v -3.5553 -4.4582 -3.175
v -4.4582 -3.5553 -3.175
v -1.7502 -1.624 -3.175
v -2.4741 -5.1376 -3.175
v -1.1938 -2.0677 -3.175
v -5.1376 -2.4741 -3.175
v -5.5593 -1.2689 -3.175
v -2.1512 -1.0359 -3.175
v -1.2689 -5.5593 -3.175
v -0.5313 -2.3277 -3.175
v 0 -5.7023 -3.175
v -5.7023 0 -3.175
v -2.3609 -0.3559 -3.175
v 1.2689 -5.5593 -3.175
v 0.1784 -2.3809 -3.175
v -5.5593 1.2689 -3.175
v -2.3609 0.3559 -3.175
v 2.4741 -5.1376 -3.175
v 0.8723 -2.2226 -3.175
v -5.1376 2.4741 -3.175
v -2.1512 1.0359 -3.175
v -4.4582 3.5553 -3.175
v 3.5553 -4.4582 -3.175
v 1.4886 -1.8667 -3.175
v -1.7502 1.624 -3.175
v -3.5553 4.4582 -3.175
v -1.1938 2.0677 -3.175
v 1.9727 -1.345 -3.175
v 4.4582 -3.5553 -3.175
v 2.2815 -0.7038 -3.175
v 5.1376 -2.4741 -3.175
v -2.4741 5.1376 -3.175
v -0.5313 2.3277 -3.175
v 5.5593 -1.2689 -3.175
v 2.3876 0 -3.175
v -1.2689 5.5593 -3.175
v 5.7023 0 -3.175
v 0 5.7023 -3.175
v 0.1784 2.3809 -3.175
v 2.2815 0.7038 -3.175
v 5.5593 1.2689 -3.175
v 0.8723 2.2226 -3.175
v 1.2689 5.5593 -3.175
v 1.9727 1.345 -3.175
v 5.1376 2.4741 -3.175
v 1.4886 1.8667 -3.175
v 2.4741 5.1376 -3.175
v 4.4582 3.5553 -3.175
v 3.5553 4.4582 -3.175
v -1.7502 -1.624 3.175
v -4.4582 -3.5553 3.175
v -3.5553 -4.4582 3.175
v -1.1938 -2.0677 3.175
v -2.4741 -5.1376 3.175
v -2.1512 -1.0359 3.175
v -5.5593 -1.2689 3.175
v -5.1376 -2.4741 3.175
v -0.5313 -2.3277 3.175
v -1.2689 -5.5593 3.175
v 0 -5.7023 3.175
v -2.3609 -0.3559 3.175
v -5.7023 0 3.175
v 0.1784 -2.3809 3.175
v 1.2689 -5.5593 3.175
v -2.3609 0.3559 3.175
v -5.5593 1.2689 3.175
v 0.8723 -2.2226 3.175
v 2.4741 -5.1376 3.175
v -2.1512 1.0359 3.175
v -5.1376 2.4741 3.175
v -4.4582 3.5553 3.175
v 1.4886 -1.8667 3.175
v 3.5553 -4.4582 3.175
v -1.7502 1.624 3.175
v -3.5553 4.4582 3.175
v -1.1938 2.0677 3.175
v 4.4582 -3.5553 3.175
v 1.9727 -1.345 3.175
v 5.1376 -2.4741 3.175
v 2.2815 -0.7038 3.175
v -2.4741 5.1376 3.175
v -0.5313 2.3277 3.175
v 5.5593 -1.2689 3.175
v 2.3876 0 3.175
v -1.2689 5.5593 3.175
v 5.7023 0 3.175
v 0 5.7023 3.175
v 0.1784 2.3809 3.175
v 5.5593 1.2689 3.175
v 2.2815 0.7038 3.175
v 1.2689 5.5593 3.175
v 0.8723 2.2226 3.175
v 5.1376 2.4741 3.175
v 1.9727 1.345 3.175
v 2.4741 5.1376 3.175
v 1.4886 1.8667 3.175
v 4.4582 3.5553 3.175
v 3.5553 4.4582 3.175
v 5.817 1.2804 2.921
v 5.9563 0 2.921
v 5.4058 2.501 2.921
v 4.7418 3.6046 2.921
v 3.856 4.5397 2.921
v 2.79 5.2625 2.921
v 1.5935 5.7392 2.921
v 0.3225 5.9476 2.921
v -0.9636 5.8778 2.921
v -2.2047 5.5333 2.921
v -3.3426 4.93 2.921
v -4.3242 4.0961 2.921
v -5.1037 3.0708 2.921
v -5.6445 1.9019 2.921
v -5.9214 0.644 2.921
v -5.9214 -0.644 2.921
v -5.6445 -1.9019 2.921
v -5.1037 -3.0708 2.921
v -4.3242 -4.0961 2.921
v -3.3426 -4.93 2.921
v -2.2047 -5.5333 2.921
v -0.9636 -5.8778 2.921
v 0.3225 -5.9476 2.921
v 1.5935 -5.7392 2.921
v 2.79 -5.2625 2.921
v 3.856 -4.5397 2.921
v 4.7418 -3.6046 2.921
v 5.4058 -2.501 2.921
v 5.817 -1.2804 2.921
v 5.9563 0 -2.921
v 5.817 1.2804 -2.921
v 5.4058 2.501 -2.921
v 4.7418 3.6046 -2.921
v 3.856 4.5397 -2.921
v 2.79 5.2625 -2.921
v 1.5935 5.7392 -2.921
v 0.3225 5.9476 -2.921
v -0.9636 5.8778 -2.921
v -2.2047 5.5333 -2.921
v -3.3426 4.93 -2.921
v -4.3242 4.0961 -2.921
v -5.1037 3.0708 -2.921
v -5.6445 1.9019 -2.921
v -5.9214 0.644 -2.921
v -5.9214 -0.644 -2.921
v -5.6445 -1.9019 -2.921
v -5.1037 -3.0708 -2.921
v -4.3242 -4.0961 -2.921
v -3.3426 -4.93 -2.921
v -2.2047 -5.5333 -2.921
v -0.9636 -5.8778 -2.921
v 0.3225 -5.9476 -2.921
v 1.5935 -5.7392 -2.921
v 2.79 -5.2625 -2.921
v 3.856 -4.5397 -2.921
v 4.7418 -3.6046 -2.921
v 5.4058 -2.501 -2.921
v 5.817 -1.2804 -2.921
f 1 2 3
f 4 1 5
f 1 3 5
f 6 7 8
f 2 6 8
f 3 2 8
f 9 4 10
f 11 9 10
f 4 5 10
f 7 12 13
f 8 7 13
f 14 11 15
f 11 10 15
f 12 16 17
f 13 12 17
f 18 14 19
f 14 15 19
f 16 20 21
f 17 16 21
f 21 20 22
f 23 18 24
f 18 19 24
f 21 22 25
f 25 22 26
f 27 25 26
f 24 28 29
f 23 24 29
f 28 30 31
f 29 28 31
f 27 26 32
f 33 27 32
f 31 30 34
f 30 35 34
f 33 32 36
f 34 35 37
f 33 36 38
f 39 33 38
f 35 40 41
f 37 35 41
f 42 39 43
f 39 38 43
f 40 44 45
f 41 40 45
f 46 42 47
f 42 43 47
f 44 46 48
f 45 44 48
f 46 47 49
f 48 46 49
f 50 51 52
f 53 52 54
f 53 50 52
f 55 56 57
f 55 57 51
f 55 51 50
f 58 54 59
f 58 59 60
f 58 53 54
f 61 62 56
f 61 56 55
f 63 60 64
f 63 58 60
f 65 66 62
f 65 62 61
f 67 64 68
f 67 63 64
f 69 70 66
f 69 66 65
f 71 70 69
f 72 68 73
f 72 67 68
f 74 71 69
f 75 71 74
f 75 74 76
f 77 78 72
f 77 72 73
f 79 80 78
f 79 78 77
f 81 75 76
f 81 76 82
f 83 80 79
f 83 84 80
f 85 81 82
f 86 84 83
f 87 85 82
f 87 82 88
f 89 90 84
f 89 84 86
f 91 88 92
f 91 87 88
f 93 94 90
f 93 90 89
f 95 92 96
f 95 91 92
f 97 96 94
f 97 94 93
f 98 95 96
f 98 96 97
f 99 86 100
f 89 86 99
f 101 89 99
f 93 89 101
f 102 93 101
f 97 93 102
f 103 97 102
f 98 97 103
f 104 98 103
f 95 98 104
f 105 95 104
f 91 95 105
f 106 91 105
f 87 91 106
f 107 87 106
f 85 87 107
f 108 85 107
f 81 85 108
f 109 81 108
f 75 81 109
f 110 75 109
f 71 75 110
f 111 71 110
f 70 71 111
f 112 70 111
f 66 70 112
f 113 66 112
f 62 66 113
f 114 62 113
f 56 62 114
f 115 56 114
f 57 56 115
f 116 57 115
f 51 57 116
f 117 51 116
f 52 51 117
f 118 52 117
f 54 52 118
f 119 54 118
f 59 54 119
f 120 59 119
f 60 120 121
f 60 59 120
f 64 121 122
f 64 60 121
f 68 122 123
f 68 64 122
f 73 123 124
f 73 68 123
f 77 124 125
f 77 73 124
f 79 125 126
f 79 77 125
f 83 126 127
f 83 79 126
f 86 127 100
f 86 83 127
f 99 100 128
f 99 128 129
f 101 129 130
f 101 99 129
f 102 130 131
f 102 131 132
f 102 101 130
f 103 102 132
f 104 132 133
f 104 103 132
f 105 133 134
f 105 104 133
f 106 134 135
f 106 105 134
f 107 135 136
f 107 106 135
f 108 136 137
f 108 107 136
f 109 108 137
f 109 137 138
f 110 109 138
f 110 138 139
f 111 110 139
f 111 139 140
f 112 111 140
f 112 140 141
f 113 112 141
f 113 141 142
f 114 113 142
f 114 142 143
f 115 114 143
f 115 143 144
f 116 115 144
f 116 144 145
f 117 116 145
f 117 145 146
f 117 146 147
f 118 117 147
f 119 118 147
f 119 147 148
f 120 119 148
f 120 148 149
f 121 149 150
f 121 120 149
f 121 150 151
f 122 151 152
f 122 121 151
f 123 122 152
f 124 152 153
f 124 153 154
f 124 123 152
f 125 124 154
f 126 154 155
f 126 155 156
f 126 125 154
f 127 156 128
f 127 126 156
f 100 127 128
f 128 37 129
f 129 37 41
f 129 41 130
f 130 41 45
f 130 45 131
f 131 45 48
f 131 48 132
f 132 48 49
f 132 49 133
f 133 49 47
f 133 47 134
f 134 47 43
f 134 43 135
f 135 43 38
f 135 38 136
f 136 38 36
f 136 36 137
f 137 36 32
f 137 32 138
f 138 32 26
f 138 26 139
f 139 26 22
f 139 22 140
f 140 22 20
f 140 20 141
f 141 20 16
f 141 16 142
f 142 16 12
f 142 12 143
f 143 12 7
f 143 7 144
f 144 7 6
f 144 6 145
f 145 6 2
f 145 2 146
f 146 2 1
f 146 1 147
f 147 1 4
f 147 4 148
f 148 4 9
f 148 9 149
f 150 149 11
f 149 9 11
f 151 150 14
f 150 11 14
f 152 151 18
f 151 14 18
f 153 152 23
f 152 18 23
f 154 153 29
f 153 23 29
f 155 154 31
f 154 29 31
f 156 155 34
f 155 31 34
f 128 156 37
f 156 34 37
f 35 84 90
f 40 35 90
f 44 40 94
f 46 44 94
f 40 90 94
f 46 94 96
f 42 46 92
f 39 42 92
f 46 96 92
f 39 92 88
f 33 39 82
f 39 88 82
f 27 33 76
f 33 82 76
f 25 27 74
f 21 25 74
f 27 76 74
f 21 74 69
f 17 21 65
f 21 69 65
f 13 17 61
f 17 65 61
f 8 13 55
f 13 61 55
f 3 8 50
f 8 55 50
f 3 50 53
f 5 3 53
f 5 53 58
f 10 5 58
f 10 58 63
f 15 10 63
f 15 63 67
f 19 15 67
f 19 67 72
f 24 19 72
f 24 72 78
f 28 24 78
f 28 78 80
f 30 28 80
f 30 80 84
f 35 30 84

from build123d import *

# Parameters (mm, degrees)
SKETCH1_R      = 5.9563
EXTRUDE1_DEPTH = 3.175
SKETCH2_R      = 2.3876
EXTRUDE2_DEPTH = 11.548816018
CHAMFER1_SIZE  = 0.254


with BuildPart() as part:
    # Sketch1 → Extrude1 (new, symmetric)
    with BuildSketch(Plane.XY):
        Circle(SKETCH1_R)
    extrude(amount=EXTRUDE1_DEPTH, both=True)

    # Sketch2 → Extrude2 (cut, through all)
    with BuildSketch(Plane.XY.offset(3.175)):
        Circle(SKETCH2_R)
    extrude(amount=-EXTRUDE2_DEPTH, mode=Mode.SUBTRACT)

    # Chamfer1
    chamfer1_edges = [part.edges().sort_by_distance(p)[0] for p in [
        (-5.9563, 0, -3.175),
        (-5.9563, 0, 3.175),
    ]]
    chamfer(chamfer1_edges, length=CHAMFER1_SIZE)


solid = part.part
